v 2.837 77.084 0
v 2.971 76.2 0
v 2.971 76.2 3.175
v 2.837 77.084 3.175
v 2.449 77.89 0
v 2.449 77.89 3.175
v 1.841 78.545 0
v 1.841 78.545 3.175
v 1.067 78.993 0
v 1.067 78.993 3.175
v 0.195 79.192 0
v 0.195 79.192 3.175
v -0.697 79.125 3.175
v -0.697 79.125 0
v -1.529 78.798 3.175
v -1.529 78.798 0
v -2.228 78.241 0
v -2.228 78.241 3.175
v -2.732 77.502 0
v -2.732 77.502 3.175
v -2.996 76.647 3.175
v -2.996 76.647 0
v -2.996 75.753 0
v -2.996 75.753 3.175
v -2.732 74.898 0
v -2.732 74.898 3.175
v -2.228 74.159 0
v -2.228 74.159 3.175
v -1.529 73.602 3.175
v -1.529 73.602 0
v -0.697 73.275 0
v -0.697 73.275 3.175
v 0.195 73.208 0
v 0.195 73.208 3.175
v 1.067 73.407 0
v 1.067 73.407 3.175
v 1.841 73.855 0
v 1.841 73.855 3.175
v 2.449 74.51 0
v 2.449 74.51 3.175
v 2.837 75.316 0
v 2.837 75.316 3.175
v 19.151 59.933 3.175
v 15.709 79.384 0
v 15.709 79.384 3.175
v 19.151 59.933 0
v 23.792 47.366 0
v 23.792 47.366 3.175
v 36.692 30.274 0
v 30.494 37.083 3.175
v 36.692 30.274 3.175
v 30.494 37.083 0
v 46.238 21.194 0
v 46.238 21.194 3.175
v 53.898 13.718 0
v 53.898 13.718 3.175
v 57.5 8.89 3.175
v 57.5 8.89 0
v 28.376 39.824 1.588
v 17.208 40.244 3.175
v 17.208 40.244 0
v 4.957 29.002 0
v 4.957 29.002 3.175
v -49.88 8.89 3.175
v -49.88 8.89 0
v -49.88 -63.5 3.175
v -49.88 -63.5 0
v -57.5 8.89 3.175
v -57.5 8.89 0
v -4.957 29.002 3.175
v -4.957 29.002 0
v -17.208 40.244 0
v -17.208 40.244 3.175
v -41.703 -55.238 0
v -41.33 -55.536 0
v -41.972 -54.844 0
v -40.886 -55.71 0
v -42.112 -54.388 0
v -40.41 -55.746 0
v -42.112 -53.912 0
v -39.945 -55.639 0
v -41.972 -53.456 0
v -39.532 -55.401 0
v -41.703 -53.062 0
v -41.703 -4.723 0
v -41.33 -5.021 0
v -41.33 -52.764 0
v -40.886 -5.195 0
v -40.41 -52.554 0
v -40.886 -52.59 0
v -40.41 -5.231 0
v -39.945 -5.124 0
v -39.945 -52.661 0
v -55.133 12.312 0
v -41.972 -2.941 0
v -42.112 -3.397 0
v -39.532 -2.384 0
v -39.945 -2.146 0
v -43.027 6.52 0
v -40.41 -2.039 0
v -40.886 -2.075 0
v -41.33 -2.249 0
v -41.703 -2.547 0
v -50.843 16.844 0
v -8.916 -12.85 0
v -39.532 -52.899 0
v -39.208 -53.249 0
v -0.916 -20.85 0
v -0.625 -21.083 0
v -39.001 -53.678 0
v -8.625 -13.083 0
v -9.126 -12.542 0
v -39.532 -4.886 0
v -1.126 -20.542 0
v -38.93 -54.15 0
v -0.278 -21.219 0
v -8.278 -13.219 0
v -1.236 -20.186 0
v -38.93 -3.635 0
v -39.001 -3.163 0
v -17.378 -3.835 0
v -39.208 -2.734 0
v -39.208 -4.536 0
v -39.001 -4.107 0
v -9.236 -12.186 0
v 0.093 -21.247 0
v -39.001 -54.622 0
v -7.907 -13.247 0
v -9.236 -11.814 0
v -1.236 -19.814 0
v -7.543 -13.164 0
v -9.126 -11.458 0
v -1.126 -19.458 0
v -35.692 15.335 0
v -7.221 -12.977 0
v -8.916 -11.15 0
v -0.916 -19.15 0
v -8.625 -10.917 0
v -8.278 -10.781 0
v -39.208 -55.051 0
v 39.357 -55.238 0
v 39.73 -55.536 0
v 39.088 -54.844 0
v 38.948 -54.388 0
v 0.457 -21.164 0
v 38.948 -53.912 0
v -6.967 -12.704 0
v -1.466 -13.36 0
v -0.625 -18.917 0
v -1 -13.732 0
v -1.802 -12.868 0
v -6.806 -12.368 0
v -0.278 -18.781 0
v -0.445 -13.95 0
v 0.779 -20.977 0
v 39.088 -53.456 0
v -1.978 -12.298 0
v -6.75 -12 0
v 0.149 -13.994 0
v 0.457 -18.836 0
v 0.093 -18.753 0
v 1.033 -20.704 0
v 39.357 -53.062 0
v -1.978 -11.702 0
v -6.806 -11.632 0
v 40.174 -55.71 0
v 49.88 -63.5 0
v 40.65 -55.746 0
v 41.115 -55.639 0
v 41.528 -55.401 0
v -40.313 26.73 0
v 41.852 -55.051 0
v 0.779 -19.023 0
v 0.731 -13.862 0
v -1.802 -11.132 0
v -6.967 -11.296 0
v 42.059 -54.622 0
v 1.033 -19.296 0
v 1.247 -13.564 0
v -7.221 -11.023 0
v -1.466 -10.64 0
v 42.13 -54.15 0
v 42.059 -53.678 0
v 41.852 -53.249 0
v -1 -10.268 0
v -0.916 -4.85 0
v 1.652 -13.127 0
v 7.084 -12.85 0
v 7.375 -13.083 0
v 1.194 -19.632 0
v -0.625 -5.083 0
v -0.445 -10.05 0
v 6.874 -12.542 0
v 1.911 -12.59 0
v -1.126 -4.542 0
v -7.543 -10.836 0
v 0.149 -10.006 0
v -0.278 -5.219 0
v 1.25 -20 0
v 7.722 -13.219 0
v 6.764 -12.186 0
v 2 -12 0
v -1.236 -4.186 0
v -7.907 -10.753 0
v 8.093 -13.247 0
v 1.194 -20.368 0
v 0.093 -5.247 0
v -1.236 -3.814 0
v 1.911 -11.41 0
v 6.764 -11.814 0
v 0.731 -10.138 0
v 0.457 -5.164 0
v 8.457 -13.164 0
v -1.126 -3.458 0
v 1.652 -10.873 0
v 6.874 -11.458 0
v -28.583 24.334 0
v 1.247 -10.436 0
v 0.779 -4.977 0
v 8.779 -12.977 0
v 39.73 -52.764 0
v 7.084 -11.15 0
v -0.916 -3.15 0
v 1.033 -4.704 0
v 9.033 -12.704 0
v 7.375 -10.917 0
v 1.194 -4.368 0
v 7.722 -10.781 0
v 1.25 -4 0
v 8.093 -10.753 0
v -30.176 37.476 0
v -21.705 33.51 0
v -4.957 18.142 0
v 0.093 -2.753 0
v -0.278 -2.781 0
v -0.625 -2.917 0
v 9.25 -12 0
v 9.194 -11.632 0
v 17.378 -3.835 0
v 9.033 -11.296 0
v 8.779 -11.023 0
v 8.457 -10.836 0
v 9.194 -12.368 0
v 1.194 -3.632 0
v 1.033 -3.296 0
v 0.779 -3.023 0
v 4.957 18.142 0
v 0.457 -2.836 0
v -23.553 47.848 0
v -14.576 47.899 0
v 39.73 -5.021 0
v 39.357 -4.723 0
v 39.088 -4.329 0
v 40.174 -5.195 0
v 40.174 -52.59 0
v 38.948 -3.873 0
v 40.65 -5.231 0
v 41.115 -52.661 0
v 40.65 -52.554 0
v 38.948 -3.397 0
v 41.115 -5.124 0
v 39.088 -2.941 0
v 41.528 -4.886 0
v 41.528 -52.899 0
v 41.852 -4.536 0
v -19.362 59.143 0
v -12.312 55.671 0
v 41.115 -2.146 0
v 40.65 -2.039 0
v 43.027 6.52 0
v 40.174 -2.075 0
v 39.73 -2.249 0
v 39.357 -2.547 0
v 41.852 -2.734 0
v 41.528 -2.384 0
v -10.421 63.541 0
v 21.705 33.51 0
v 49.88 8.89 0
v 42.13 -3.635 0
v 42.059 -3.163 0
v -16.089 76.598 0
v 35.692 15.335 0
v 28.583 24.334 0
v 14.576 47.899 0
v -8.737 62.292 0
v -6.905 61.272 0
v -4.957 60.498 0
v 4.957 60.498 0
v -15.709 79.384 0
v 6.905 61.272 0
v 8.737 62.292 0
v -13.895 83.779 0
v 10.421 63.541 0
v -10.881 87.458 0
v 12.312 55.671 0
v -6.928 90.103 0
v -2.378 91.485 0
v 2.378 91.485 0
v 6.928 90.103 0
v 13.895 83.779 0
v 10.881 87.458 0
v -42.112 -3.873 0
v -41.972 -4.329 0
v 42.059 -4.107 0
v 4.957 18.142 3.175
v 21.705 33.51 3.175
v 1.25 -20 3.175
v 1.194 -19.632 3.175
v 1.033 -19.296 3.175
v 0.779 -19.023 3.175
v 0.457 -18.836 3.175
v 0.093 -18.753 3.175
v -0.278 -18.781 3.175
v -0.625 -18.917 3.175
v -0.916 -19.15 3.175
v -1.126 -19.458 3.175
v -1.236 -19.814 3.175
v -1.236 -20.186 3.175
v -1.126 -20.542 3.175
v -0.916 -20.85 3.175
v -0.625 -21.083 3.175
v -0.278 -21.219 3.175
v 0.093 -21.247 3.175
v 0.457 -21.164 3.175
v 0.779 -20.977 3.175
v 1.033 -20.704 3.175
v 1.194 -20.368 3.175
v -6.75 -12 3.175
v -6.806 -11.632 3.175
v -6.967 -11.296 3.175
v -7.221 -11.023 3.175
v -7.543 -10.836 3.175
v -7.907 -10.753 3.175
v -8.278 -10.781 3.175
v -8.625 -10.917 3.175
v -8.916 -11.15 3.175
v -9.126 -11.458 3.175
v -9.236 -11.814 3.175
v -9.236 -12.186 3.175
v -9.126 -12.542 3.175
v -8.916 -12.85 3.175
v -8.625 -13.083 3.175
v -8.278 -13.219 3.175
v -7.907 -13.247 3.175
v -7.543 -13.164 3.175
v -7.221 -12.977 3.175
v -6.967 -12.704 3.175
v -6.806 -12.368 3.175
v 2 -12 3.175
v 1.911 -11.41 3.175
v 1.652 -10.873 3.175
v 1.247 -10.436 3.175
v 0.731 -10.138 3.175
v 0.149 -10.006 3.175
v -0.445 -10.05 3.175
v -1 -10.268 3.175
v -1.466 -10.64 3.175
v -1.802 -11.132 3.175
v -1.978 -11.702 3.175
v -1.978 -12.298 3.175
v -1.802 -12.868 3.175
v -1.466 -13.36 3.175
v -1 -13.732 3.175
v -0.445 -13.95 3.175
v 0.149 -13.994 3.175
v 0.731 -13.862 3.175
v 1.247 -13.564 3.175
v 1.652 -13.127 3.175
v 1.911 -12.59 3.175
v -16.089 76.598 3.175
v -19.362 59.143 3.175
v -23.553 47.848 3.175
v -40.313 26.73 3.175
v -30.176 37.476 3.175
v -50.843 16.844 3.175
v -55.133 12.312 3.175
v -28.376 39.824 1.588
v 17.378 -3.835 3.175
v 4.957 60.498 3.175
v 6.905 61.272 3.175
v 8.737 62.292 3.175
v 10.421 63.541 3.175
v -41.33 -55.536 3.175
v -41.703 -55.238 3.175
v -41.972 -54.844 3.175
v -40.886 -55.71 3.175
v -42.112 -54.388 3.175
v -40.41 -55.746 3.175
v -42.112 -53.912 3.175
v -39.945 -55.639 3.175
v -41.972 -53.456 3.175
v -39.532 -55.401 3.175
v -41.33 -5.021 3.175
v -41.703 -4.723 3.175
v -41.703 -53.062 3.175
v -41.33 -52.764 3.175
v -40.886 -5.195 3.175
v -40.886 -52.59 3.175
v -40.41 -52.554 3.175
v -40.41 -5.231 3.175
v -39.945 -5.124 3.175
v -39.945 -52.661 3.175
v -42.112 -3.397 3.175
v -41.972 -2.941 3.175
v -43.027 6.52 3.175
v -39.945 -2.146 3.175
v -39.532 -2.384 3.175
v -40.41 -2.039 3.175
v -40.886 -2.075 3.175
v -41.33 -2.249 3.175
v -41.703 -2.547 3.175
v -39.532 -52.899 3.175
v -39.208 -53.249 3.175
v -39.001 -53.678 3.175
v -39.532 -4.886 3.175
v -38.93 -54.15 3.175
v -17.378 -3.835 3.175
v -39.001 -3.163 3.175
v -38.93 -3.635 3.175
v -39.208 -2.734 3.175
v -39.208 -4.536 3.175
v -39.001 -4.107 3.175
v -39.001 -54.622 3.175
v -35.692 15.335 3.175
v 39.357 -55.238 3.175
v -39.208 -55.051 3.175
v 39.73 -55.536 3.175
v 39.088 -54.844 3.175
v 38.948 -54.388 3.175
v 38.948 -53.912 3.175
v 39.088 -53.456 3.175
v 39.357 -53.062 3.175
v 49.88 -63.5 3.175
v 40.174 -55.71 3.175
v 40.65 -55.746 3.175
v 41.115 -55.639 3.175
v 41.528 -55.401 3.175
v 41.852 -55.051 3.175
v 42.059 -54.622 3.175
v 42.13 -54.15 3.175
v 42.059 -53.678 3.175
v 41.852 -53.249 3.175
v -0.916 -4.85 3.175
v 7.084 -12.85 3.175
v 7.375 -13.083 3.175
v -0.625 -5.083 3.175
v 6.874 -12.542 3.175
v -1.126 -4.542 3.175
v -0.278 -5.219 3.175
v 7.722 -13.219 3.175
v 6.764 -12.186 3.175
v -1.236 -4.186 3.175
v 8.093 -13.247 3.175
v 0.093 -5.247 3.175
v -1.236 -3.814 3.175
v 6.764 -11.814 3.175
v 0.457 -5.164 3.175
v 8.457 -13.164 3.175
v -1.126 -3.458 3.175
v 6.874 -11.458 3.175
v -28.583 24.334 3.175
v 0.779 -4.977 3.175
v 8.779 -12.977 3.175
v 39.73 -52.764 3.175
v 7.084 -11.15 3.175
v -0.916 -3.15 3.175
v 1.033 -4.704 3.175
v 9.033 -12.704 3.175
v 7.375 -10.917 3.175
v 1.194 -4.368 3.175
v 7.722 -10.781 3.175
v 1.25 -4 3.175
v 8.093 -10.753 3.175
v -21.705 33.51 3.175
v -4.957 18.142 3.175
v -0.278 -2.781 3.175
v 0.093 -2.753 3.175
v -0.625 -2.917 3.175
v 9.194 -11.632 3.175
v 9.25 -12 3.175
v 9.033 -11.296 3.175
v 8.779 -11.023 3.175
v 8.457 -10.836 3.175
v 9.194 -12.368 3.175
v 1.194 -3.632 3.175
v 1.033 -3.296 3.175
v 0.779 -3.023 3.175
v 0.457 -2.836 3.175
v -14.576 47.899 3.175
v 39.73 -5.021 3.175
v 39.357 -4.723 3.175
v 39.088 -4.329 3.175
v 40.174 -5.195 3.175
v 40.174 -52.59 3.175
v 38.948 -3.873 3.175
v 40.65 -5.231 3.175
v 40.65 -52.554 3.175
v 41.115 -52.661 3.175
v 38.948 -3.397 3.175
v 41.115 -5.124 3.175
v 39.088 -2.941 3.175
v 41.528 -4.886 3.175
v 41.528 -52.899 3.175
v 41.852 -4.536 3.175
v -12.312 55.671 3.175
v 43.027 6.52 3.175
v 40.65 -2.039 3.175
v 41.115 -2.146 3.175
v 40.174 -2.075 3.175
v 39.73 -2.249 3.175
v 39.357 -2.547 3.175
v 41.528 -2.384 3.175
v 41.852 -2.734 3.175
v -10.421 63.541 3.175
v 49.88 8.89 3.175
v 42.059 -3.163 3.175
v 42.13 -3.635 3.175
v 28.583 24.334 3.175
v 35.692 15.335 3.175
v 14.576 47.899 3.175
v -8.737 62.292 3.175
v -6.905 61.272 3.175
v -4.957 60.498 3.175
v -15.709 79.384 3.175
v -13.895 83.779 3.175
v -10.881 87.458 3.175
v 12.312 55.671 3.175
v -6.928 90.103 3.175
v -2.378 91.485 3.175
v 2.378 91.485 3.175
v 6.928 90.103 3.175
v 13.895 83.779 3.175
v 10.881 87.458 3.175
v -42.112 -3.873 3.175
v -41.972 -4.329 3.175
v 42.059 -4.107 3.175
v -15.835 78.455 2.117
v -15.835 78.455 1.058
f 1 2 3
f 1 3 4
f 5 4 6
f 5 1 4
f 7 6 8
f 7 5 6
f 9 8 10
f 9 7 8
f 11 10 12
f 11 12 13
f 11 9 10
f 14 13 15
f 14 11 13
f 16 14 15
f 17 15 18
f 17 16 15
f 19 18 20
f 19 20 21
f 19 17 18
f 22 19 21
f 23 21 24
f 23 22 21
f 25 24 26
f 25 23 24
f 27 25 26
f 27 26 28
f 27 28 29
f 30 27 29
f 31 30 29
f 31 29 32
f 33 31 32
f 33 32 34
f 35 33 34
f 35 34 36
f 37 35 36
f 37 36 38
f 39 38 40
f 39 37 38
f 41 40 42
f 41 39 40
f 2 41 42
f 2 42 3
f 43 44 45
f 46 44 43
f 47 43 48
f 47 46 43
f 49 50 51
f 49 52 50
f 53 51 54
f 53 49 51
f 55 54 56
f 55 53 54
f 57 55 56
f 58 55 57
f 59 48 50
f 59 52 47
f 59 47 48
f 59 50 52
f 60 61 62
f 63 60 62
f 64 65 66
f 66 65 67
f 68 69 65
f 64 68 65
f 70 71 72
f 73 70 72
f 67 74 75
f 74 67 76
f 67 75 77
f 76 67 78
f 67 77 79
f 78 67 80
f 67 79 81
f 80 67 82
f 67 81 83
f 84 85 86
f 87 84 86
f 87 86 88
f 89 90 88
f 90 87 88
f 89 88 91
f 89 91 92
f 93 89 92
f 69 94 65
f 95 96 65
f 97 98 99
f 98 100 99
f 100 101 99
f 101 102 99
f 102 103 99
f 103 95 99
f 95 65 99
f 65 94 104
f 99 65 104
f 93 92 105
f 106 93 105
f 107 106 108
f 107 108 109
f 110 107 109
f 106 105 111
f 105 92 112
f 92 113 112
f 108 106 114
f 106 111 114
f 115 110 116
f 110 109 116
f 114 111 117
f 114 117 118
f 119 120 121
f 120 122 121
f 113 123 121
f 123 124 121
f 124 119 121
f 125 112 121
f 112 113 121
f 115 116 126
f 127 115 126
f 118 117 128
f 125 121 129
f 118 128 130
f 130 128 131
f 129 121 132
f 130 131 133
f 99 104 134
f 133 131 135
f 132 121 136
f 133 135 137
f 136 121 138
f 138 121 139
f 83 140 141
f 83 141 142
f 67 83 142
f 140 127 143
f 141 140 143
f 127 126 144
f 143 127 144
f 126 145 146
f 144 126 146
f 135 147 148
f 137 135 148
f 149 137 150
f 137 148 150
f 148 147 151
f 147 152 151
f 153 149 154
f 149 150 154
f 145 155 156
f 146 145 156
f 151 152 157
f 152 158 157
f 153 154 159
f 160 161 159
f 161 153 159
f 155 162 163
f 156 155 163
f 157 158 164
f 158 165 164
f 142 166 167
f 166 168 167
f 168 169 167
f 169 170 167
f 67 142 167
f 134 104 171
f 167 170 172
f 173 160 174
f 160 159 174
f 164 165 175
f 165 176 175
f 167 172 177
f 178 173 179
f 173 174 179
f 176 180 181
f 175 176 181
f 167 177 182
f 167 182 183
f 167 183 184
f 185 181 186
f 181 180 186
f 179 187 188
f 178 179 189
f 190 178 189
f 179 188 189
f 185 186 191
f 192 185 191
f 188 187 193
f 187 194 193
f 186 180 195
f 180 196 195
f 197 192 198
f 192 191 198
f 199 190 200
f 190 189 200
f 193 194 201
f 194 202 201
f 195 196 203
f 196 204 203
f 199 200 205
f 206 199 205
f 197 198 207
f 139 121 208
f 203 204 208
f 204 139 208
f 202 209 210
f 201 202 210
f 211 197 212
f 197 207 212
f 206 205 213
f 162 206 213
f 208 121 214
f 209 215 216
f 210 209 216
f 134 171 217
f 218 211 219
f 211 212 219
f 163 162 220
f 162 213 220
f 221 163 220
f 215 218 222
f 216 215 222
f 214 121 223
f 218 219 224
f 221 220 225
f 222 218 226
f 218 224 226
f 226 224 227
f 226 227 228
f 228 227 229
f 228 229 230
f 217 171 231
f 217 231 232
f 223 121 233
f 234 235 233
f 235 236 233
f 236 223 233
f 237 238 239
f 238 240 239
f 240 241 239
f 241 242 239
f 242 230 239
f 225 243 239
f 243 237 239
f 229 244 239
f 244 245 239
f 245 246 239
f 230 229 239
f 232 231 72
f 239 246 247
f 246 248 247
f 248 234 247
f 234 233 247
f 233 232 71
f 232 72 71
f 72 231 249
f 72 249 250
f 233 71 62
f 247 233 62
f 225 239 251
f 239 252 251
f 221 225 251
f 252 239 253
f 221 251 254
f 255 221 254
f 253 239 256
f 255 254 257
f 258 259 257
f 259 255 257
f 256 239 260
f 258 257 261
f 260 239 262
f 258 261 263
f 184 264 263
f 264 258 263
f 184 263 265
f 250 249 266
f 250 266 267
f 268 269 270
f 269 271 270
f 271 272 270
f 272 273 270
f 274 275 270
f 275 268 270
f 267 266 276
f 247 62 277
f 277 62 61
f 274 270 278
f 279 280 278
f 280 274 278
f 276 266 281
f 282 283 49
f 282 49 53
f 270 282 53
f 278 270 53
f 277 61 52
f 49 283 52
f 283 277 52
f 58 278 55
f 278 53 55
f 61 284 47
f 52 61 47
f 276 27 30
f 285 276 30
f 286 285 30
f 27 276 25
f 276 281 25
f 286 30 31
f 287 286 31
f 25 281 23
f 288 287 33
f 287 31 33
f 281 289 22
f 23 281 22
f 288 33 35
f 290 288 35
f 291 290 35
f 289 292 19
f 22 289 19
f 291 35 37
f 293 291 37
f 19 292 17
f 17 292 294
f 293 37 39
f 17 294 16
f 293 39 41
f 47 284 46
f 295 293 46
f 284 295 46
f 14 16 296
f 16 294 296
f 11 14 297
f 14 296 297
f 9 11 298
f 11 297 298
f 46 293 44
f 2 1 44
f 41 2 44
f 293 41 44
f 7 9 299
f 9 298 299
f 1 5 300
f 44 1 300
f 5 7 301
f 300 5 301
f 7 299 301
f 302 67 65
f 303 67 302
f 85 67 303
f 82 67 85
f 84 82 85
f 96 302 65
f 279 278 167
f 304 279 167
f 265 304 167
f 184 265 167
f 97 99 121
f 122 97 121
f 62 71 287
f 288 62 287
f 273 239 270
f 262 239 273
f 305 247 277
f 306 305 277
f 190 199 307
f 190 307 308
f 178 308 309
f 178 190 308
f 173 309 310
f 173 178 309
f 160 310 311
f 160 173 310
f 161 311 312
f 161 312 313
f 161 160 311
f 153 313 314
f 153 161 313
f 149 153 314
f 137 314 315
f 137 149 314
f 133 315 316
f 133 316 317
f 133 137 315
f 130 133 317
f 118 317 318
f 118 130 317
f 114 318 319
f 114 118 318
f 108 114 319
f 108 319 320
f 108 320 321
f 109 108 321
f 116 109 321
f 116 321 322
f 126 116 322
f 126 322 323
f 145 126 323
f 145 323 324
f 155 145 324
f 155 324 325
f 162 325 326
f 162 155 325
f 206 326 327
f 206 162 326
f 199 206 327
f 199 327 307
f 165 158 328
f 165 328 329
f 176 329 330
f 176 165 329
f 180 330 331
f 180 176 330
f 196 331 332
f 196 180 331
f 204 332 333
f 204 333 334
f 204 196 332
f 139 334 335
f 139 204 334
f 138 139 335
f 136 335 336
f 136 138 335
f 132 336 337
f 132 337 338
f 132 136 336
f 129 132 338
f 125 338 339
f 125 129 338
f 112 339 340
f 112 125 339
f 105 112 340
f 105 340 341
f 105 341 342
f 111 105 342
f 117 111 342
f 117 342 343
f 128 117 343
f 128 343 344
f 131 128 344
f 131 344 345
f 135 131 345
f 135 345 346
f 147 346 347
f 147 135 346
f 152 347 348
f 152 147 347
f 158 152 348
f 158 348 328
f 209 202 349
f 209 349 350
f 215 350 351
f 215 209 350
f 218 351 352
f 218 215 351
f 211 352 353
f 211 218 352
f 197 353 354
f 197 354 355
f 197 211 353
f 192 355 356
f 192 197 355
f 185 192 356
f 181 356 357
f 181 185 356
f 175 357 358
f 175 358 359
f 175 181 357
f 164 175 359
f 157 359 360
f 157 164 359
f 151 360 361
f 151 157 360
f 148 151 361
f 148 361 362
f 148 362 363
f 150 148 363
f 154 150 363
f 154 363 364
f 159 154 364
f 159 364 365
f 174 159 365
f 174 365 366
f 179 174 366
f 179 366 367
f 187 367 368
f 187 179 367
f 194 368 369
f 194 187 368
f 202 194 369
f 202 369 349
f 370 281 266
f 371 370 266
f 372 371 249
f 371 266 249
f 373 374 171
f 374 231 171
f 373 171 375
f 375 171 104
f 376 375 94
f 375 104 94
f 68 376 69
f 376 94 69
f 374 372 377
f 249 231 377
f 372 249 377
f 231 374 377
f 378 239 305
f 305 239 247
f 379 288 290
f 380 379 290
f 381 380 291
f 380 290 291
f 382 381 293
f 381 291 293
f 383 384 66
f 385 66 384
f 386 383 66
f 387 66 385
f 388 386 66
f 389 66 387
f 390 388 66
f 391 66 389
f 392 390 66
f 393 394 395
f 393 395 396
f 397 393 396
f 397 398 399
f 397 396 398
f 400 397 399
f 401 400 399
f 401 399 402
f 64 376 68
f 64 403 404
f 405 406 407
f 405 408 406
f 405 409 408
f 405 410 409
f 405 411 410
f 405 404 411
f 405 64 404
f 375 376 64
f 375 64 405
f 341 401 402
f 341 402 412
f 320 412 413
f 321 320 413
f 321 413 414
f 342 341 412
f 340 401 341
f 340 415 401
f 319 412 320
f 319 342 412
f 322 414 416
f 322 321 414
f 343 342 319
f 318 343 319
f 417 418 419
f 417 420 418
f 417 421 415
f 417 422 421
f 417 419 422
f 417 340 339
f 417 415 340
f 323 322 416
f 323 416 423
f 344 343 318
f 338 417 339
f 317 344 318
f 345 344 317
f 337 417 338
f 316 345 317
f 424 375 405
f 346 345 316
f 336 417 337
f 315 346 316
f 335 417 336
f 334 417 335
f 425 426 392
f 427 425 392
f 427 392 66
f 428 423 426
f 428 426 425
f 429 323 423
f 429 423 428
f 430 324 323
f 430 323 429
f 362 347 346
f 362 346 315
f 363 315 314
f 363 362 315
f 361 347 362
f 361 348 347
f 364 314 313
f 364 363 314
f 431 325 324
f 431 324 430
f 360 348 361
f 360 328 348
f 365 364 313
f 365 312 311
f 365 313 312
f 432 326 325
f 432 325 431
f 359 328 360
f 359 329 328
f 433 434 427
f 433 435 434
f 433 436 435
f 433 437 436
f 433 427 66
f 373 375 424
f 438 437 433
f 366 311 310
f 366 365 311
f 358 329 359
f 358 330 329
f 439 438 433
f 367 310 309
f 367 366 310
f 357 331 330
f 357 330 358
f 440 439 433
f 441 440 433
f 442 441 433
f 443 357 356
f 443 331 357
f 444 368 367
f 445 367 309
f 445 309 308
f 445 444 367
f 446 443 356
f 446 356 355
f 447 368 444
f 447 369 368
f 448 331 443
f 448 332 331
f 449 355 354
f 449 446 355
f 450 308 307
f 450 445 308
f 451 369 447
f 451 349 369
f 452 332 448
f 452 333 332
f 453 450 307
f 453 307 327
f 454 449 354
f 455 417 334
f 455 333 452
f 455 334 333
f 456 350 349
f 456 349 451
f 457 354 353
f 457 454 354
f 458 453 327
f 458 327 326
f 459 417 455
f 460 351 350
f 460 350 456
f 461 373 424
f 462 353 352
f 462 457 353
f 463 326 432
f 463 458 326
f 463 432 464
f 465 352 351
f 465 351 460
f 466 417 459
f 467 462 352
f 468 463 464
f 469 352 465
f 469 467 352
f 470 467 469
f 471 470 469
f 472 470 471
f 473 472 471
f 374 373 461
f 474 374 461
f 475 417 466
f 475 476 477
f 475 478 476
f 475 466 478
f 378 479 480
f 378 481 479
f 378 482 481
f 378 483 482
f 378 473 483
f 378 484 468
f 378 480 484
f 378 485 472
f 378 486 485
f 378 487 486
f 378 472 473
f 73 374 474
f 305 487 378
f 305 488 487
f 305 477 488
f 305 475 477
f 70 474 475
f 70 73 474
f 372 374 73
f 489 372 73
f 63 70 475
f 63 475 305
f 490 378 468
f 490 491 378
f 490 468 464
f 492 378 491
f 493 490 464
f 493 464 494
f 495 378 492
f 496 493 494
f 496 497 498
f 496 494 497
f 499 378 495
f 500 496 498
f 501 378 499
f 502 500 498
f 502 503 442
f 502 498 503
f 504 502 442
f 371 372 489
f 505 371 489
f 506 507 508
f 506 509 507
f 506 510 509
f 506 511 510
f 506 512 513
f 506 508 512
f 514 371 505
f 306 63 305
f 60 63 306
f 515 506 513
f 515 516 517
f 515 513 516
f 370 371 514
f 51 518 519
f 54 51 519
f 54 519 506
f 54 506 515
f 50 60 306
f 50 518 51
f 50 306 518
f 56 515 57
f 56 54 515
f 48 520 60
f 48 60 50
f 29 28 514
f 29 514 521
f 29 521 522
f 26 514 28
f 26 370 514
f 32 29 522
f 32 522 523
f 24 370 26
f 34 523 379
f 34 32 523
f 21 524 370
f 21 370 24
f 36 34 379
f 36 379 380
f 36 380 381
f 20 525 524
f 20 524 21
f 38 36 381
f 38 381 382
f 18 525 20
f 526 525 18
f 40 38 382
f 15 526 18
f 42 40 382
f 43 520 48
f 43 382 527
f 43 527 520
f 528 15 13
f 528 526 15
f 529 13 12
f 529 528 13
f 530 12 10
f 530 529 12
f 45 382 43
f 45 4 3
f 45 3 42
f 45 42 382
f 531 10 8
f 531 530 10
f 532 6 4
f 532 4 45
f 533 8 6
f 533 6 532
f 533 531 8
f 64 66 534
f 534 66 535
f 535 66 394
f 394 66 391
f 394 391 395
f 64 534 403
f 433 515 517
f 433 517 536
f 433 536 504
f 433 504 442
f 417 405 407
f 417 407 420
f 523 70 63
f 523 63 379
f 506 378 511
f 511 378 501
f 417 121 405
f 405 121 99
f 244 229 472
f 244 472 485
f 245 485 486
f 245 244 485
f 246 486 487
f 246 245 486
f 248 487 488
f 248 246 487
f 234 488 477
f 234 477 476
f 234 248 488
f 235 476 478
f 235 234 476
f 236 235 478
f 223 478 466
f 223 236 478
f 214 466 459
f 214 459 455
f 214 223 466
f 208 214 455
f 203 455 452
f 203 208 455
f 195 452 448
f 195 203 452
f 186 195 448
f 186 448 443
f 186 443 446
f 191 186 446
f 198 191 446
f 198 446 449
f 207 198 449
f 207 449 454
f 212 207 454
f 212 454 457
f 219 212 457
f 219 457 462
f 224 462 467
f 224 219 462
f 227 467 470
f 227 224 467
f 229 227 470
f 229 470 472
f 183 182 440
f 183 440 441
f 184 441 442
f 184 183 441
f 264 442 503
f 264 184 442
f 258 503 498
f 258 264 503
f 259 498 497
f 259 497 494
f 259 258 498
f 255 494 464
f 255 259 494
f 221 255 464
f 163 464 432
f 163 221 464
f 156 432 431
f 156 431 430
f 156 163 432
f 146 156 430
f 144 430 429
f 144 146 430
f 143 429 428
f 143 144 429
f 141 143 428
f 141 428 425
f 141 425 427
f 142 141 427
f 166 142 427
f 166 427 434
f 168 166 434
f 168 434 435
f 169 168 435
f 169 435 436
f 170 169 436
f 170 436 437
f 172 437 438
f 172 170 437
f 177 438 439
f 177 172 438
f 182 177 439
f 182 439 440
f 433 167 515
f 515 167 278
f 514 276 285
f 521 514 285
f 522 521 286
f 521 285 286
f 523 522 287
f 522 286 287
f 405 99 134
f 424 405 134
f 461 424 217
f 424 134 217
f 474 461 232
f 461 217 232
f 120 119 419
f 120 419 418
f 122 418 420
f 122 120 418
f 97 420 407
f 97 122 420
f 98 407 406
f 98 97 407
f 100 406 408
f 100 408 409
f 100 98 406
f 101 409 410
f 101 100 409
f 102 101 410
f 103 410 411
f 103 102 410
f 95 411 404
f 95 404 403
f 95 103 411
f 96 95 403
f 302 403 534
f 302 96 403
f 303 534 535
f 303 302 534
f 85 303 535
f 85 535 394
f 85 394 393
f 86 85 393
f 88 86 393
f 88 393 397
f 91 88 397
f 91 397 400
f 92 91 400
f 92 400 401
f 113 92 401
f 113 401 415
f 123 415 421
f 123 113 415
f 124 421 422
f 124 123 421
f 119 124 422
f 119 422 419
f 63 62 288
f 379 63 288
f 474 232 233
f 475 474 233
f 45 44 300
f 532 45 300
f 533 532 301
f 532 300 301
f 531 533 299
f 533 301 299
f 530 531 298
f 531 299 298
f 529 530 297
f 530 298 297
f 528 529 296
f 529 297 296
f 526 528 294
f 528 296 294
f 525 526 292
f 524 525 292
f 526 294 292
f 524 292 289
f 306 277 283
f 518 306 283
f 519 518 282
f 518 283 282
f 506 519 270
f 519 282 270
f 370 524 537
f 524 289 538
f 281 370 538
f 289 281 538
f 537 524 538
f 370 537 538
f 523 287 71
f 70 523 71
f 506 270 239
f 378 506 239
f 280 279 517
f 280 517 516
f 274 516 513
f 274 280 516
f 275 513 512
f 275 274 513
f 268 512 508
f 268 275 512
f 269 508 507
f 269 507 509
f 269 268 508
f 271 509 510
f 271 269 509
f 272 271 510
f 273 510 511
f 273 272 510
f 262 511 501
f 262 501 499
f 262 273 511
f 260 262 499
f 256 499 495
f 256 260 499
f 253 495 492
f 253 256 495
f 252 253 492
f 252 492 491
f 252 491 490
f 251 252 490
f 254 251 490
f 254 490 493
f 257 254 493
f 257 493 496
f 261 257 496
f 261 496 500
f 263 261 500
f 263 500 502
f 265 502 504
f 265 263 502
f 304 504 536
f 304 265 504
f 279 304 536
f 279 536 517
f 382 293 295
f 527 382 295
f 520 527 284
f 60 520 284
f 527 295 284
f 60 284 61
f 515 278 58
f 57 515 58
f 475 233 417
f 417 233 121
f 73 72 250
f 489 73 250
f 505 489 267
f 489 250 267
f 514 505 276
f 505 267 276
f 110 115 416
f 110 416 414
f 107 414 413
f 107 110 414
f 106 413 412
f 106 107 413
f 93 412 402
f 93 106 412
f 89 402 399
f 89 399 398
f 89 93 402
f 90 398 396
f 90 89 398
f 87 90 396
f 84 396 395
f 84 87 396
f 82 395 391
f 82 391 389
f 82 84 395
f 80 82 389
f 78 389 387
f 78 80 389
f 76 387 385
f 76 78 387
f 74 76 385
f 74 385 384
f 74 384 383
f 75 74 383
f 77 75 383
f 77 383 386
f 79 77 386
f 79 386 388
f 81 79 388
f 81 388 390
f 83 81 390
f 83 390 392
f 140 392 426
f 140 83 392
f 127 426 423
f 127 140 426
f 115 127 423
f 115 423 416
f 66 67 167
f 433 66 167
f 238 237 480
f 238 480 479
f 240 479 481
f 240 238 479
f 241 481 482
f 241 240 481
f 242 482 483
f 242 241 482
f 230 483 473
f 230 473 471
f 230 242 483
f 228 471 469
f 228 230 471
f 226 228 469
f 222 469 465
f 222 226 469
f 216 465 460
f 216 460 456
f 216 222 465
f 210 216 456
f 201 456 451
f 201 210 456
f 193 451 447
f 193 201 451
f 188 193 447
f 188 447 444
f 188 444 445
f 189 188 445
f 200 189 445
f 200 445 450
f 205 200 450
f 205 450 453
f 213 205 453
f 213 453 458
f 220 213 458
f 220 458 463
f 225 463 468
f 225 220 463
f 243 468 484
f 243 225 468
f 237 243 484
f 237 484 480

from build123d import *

# Parameters (mm, degrees)
F0_R     = 1.6
F0_R_2   = 1.25
F0_R_3   = 2
F0_R_4   = 3
F1_DEPTH = 3.175


# Not quite as in the source:
# - a feature names something its author has since deleted; it is built from what else it names


with BuildPart() as f1:
    # F0 (on Top) → F1 (new body)
    with BuildSketch(Plane.XY):
        with BuildLine():
            Line((-49.8799999985, 8.89), (-49.8799999985, -63.5))
            Line((-49.8799999985, -63.5), (49.8799999985, -63.5))
            Line((49.8799999985, -63.5), (49.8799999985, 8.89))
            Line((49.8799999985, 8.89), (57.4999999985, 8.89))
            add(Edge.make_bspline(
                [(15.7093216459, 79.3836478465), (17.5511050126, 65.7915878149), (21.2374579051, 38.4486252292), (53.8863670451, 16.0459412112), (57.4999999985, 8.89)],
                knots=[0, 0, 0, 0, 0.4099092451, 0.8244764195, 0.8244764195, 0.8244764195, 0.8244764195], degree=3))
            ThreePointArc((15.7093216459, 79.3836478465), (0, 91.6600956823), (-15.7093216459, 79.3836478465))
            add(Edge.make_bspline(
                [(-15.7093216459, 79.3836478465), (-15.8351413169, 78.4551192516), (-15.960918893, 77.5265804672), (-16.0889396188, 76.5984215036)],
                knots=[0, 0, 0, 0, 0.0280025584, 0.0280025584, 0.0280025584, 0.0280025584], degree=3))
            add(Edge.make_bspline(
                [(-16.0889396188, 76.5984215036), (-17.8349219122, 63.9399312026), (-22.3463470917, 37.6877393462), (-53.8863670451, 16.0459412112), (-57.4999999985, 8.89)],
                knots=[0.0280025584, 0.0280025584, 0.0280025584, 0.0280025584, 0.4099092451, 0.8244764195, 0.8244764195, 0.8244764195, 0.8244764195], degree=3))
            Line((-57.4999999985, 8.89), (-49.8799999985, 8.89))
        make_face()
        with Locations((-40.5299999985, -54.15)):
            Circle(F0_R, mode=Mode.SUBTRACT)
        with Locations((-40.5299999985, -3.635)):
            Circle(F0_R, mode=Mode.SUBTRACT)
        with Locations((-8, -12)):
            Circle(F0_R_2, mode=Mode.SUBTRACT)
        with Locations((40.5299999985, -54.15)):
            Circle(F0_R, mode=Mode.SUBTRACT)
        with Locations((0, -20)):
            Circle(F0_R_2, mode=Mode.SUBTRACT)
        with Locations((0, -12)):
            Circle(F0_R_3, mode=Mode.SUBTRACT)
        with Locations((8, -12)):
            Circle(F0_R_2, mode=Mode.SUBTRACT)
        with Locations((0, -4)):
            Circle(F0_R_2, mode=Mode.SUBTRACT)
        with Locations((40.5299999985, -3.635)):
            Circle(F0_R, mode=Mode.SUBTRACT)
        with BuildLine():
            Line((-21.7048343448, 33.51030308), (-4.9567933963, 18.14211905))
            Line((-4.9567933963, 18.14211905), (-17.3775311559, -3.8353991695))
            Line((-17.3775311559, -3.8353991695), (-43.0274941027, 6.520065479))
            ThreePointArc((-43.0274941027, 6.520065479), (-32.1093228463, 19.8122760508), (-21.7048343448, 33.51030308))
        make_face(mode=Mode.SUBTRACT)
        with BuildLine():
            ThreePointArc((-10.4206144746, 63.5413418448), (-7.8378238948, 61.7519957694), (-4.9567933963, 60.4981098798))
            Line((-4.9567933963, 60.4981098798), (-4.9567933963, 29.0021225758))
            Line((-4.9567933963, 29.0021225758), (-17.2076895833, 40.2436777949))
            ThreePointArc((-17.2076895833, 40.2436777949), (-13.397490451, 51.7711279758), (-10.4206144746, 63.5413418448))
        make_face(mode=Mode.SUBTRACT)
        with Locations((-0.0292583045, 76.2)):
            Circle(F0_R_4, mode=Mode.SUBTRACT)
        with BuildLine():
            Line((17.3775311559, -3.8353991695), (4.9567933963, 18.14211905))
            Line((4.9567933963, 18.14211905), (21.7048343448, 33.51030308))
            ThreePointArc((21.7048343448, 33.51030308), (32.1093228463, 19.8122760508), (43.0274941027, 6.520065479))
            Line((43.0274941027, 6.520065479), (17.3775311559, -3.8353991695))
        make_face(mode=Mode.SUBTRACT)
        with BuildLine():
            Line((17.2076895833, 40.2436777949), (4.9567933963, 29.0021225758))
            Line((4.9567933963, 29.0021225758), (4.9567933963, 60.4981098798))
            ThreePointArc((4.9567933963, 60.4981098798), (7.8378238948, 61.7519957694), (10.4206144746, 63.5413418448))
            ThreePointArc((10.4206144746, 63.5413418448), (13.397490451, 51.7711279758), (17.2076895833, 40.2436777949))
        make_face(mode=Mode.SUBTRACT)
    extrude(amount=F1_DEPTH)


solid = f1.part
